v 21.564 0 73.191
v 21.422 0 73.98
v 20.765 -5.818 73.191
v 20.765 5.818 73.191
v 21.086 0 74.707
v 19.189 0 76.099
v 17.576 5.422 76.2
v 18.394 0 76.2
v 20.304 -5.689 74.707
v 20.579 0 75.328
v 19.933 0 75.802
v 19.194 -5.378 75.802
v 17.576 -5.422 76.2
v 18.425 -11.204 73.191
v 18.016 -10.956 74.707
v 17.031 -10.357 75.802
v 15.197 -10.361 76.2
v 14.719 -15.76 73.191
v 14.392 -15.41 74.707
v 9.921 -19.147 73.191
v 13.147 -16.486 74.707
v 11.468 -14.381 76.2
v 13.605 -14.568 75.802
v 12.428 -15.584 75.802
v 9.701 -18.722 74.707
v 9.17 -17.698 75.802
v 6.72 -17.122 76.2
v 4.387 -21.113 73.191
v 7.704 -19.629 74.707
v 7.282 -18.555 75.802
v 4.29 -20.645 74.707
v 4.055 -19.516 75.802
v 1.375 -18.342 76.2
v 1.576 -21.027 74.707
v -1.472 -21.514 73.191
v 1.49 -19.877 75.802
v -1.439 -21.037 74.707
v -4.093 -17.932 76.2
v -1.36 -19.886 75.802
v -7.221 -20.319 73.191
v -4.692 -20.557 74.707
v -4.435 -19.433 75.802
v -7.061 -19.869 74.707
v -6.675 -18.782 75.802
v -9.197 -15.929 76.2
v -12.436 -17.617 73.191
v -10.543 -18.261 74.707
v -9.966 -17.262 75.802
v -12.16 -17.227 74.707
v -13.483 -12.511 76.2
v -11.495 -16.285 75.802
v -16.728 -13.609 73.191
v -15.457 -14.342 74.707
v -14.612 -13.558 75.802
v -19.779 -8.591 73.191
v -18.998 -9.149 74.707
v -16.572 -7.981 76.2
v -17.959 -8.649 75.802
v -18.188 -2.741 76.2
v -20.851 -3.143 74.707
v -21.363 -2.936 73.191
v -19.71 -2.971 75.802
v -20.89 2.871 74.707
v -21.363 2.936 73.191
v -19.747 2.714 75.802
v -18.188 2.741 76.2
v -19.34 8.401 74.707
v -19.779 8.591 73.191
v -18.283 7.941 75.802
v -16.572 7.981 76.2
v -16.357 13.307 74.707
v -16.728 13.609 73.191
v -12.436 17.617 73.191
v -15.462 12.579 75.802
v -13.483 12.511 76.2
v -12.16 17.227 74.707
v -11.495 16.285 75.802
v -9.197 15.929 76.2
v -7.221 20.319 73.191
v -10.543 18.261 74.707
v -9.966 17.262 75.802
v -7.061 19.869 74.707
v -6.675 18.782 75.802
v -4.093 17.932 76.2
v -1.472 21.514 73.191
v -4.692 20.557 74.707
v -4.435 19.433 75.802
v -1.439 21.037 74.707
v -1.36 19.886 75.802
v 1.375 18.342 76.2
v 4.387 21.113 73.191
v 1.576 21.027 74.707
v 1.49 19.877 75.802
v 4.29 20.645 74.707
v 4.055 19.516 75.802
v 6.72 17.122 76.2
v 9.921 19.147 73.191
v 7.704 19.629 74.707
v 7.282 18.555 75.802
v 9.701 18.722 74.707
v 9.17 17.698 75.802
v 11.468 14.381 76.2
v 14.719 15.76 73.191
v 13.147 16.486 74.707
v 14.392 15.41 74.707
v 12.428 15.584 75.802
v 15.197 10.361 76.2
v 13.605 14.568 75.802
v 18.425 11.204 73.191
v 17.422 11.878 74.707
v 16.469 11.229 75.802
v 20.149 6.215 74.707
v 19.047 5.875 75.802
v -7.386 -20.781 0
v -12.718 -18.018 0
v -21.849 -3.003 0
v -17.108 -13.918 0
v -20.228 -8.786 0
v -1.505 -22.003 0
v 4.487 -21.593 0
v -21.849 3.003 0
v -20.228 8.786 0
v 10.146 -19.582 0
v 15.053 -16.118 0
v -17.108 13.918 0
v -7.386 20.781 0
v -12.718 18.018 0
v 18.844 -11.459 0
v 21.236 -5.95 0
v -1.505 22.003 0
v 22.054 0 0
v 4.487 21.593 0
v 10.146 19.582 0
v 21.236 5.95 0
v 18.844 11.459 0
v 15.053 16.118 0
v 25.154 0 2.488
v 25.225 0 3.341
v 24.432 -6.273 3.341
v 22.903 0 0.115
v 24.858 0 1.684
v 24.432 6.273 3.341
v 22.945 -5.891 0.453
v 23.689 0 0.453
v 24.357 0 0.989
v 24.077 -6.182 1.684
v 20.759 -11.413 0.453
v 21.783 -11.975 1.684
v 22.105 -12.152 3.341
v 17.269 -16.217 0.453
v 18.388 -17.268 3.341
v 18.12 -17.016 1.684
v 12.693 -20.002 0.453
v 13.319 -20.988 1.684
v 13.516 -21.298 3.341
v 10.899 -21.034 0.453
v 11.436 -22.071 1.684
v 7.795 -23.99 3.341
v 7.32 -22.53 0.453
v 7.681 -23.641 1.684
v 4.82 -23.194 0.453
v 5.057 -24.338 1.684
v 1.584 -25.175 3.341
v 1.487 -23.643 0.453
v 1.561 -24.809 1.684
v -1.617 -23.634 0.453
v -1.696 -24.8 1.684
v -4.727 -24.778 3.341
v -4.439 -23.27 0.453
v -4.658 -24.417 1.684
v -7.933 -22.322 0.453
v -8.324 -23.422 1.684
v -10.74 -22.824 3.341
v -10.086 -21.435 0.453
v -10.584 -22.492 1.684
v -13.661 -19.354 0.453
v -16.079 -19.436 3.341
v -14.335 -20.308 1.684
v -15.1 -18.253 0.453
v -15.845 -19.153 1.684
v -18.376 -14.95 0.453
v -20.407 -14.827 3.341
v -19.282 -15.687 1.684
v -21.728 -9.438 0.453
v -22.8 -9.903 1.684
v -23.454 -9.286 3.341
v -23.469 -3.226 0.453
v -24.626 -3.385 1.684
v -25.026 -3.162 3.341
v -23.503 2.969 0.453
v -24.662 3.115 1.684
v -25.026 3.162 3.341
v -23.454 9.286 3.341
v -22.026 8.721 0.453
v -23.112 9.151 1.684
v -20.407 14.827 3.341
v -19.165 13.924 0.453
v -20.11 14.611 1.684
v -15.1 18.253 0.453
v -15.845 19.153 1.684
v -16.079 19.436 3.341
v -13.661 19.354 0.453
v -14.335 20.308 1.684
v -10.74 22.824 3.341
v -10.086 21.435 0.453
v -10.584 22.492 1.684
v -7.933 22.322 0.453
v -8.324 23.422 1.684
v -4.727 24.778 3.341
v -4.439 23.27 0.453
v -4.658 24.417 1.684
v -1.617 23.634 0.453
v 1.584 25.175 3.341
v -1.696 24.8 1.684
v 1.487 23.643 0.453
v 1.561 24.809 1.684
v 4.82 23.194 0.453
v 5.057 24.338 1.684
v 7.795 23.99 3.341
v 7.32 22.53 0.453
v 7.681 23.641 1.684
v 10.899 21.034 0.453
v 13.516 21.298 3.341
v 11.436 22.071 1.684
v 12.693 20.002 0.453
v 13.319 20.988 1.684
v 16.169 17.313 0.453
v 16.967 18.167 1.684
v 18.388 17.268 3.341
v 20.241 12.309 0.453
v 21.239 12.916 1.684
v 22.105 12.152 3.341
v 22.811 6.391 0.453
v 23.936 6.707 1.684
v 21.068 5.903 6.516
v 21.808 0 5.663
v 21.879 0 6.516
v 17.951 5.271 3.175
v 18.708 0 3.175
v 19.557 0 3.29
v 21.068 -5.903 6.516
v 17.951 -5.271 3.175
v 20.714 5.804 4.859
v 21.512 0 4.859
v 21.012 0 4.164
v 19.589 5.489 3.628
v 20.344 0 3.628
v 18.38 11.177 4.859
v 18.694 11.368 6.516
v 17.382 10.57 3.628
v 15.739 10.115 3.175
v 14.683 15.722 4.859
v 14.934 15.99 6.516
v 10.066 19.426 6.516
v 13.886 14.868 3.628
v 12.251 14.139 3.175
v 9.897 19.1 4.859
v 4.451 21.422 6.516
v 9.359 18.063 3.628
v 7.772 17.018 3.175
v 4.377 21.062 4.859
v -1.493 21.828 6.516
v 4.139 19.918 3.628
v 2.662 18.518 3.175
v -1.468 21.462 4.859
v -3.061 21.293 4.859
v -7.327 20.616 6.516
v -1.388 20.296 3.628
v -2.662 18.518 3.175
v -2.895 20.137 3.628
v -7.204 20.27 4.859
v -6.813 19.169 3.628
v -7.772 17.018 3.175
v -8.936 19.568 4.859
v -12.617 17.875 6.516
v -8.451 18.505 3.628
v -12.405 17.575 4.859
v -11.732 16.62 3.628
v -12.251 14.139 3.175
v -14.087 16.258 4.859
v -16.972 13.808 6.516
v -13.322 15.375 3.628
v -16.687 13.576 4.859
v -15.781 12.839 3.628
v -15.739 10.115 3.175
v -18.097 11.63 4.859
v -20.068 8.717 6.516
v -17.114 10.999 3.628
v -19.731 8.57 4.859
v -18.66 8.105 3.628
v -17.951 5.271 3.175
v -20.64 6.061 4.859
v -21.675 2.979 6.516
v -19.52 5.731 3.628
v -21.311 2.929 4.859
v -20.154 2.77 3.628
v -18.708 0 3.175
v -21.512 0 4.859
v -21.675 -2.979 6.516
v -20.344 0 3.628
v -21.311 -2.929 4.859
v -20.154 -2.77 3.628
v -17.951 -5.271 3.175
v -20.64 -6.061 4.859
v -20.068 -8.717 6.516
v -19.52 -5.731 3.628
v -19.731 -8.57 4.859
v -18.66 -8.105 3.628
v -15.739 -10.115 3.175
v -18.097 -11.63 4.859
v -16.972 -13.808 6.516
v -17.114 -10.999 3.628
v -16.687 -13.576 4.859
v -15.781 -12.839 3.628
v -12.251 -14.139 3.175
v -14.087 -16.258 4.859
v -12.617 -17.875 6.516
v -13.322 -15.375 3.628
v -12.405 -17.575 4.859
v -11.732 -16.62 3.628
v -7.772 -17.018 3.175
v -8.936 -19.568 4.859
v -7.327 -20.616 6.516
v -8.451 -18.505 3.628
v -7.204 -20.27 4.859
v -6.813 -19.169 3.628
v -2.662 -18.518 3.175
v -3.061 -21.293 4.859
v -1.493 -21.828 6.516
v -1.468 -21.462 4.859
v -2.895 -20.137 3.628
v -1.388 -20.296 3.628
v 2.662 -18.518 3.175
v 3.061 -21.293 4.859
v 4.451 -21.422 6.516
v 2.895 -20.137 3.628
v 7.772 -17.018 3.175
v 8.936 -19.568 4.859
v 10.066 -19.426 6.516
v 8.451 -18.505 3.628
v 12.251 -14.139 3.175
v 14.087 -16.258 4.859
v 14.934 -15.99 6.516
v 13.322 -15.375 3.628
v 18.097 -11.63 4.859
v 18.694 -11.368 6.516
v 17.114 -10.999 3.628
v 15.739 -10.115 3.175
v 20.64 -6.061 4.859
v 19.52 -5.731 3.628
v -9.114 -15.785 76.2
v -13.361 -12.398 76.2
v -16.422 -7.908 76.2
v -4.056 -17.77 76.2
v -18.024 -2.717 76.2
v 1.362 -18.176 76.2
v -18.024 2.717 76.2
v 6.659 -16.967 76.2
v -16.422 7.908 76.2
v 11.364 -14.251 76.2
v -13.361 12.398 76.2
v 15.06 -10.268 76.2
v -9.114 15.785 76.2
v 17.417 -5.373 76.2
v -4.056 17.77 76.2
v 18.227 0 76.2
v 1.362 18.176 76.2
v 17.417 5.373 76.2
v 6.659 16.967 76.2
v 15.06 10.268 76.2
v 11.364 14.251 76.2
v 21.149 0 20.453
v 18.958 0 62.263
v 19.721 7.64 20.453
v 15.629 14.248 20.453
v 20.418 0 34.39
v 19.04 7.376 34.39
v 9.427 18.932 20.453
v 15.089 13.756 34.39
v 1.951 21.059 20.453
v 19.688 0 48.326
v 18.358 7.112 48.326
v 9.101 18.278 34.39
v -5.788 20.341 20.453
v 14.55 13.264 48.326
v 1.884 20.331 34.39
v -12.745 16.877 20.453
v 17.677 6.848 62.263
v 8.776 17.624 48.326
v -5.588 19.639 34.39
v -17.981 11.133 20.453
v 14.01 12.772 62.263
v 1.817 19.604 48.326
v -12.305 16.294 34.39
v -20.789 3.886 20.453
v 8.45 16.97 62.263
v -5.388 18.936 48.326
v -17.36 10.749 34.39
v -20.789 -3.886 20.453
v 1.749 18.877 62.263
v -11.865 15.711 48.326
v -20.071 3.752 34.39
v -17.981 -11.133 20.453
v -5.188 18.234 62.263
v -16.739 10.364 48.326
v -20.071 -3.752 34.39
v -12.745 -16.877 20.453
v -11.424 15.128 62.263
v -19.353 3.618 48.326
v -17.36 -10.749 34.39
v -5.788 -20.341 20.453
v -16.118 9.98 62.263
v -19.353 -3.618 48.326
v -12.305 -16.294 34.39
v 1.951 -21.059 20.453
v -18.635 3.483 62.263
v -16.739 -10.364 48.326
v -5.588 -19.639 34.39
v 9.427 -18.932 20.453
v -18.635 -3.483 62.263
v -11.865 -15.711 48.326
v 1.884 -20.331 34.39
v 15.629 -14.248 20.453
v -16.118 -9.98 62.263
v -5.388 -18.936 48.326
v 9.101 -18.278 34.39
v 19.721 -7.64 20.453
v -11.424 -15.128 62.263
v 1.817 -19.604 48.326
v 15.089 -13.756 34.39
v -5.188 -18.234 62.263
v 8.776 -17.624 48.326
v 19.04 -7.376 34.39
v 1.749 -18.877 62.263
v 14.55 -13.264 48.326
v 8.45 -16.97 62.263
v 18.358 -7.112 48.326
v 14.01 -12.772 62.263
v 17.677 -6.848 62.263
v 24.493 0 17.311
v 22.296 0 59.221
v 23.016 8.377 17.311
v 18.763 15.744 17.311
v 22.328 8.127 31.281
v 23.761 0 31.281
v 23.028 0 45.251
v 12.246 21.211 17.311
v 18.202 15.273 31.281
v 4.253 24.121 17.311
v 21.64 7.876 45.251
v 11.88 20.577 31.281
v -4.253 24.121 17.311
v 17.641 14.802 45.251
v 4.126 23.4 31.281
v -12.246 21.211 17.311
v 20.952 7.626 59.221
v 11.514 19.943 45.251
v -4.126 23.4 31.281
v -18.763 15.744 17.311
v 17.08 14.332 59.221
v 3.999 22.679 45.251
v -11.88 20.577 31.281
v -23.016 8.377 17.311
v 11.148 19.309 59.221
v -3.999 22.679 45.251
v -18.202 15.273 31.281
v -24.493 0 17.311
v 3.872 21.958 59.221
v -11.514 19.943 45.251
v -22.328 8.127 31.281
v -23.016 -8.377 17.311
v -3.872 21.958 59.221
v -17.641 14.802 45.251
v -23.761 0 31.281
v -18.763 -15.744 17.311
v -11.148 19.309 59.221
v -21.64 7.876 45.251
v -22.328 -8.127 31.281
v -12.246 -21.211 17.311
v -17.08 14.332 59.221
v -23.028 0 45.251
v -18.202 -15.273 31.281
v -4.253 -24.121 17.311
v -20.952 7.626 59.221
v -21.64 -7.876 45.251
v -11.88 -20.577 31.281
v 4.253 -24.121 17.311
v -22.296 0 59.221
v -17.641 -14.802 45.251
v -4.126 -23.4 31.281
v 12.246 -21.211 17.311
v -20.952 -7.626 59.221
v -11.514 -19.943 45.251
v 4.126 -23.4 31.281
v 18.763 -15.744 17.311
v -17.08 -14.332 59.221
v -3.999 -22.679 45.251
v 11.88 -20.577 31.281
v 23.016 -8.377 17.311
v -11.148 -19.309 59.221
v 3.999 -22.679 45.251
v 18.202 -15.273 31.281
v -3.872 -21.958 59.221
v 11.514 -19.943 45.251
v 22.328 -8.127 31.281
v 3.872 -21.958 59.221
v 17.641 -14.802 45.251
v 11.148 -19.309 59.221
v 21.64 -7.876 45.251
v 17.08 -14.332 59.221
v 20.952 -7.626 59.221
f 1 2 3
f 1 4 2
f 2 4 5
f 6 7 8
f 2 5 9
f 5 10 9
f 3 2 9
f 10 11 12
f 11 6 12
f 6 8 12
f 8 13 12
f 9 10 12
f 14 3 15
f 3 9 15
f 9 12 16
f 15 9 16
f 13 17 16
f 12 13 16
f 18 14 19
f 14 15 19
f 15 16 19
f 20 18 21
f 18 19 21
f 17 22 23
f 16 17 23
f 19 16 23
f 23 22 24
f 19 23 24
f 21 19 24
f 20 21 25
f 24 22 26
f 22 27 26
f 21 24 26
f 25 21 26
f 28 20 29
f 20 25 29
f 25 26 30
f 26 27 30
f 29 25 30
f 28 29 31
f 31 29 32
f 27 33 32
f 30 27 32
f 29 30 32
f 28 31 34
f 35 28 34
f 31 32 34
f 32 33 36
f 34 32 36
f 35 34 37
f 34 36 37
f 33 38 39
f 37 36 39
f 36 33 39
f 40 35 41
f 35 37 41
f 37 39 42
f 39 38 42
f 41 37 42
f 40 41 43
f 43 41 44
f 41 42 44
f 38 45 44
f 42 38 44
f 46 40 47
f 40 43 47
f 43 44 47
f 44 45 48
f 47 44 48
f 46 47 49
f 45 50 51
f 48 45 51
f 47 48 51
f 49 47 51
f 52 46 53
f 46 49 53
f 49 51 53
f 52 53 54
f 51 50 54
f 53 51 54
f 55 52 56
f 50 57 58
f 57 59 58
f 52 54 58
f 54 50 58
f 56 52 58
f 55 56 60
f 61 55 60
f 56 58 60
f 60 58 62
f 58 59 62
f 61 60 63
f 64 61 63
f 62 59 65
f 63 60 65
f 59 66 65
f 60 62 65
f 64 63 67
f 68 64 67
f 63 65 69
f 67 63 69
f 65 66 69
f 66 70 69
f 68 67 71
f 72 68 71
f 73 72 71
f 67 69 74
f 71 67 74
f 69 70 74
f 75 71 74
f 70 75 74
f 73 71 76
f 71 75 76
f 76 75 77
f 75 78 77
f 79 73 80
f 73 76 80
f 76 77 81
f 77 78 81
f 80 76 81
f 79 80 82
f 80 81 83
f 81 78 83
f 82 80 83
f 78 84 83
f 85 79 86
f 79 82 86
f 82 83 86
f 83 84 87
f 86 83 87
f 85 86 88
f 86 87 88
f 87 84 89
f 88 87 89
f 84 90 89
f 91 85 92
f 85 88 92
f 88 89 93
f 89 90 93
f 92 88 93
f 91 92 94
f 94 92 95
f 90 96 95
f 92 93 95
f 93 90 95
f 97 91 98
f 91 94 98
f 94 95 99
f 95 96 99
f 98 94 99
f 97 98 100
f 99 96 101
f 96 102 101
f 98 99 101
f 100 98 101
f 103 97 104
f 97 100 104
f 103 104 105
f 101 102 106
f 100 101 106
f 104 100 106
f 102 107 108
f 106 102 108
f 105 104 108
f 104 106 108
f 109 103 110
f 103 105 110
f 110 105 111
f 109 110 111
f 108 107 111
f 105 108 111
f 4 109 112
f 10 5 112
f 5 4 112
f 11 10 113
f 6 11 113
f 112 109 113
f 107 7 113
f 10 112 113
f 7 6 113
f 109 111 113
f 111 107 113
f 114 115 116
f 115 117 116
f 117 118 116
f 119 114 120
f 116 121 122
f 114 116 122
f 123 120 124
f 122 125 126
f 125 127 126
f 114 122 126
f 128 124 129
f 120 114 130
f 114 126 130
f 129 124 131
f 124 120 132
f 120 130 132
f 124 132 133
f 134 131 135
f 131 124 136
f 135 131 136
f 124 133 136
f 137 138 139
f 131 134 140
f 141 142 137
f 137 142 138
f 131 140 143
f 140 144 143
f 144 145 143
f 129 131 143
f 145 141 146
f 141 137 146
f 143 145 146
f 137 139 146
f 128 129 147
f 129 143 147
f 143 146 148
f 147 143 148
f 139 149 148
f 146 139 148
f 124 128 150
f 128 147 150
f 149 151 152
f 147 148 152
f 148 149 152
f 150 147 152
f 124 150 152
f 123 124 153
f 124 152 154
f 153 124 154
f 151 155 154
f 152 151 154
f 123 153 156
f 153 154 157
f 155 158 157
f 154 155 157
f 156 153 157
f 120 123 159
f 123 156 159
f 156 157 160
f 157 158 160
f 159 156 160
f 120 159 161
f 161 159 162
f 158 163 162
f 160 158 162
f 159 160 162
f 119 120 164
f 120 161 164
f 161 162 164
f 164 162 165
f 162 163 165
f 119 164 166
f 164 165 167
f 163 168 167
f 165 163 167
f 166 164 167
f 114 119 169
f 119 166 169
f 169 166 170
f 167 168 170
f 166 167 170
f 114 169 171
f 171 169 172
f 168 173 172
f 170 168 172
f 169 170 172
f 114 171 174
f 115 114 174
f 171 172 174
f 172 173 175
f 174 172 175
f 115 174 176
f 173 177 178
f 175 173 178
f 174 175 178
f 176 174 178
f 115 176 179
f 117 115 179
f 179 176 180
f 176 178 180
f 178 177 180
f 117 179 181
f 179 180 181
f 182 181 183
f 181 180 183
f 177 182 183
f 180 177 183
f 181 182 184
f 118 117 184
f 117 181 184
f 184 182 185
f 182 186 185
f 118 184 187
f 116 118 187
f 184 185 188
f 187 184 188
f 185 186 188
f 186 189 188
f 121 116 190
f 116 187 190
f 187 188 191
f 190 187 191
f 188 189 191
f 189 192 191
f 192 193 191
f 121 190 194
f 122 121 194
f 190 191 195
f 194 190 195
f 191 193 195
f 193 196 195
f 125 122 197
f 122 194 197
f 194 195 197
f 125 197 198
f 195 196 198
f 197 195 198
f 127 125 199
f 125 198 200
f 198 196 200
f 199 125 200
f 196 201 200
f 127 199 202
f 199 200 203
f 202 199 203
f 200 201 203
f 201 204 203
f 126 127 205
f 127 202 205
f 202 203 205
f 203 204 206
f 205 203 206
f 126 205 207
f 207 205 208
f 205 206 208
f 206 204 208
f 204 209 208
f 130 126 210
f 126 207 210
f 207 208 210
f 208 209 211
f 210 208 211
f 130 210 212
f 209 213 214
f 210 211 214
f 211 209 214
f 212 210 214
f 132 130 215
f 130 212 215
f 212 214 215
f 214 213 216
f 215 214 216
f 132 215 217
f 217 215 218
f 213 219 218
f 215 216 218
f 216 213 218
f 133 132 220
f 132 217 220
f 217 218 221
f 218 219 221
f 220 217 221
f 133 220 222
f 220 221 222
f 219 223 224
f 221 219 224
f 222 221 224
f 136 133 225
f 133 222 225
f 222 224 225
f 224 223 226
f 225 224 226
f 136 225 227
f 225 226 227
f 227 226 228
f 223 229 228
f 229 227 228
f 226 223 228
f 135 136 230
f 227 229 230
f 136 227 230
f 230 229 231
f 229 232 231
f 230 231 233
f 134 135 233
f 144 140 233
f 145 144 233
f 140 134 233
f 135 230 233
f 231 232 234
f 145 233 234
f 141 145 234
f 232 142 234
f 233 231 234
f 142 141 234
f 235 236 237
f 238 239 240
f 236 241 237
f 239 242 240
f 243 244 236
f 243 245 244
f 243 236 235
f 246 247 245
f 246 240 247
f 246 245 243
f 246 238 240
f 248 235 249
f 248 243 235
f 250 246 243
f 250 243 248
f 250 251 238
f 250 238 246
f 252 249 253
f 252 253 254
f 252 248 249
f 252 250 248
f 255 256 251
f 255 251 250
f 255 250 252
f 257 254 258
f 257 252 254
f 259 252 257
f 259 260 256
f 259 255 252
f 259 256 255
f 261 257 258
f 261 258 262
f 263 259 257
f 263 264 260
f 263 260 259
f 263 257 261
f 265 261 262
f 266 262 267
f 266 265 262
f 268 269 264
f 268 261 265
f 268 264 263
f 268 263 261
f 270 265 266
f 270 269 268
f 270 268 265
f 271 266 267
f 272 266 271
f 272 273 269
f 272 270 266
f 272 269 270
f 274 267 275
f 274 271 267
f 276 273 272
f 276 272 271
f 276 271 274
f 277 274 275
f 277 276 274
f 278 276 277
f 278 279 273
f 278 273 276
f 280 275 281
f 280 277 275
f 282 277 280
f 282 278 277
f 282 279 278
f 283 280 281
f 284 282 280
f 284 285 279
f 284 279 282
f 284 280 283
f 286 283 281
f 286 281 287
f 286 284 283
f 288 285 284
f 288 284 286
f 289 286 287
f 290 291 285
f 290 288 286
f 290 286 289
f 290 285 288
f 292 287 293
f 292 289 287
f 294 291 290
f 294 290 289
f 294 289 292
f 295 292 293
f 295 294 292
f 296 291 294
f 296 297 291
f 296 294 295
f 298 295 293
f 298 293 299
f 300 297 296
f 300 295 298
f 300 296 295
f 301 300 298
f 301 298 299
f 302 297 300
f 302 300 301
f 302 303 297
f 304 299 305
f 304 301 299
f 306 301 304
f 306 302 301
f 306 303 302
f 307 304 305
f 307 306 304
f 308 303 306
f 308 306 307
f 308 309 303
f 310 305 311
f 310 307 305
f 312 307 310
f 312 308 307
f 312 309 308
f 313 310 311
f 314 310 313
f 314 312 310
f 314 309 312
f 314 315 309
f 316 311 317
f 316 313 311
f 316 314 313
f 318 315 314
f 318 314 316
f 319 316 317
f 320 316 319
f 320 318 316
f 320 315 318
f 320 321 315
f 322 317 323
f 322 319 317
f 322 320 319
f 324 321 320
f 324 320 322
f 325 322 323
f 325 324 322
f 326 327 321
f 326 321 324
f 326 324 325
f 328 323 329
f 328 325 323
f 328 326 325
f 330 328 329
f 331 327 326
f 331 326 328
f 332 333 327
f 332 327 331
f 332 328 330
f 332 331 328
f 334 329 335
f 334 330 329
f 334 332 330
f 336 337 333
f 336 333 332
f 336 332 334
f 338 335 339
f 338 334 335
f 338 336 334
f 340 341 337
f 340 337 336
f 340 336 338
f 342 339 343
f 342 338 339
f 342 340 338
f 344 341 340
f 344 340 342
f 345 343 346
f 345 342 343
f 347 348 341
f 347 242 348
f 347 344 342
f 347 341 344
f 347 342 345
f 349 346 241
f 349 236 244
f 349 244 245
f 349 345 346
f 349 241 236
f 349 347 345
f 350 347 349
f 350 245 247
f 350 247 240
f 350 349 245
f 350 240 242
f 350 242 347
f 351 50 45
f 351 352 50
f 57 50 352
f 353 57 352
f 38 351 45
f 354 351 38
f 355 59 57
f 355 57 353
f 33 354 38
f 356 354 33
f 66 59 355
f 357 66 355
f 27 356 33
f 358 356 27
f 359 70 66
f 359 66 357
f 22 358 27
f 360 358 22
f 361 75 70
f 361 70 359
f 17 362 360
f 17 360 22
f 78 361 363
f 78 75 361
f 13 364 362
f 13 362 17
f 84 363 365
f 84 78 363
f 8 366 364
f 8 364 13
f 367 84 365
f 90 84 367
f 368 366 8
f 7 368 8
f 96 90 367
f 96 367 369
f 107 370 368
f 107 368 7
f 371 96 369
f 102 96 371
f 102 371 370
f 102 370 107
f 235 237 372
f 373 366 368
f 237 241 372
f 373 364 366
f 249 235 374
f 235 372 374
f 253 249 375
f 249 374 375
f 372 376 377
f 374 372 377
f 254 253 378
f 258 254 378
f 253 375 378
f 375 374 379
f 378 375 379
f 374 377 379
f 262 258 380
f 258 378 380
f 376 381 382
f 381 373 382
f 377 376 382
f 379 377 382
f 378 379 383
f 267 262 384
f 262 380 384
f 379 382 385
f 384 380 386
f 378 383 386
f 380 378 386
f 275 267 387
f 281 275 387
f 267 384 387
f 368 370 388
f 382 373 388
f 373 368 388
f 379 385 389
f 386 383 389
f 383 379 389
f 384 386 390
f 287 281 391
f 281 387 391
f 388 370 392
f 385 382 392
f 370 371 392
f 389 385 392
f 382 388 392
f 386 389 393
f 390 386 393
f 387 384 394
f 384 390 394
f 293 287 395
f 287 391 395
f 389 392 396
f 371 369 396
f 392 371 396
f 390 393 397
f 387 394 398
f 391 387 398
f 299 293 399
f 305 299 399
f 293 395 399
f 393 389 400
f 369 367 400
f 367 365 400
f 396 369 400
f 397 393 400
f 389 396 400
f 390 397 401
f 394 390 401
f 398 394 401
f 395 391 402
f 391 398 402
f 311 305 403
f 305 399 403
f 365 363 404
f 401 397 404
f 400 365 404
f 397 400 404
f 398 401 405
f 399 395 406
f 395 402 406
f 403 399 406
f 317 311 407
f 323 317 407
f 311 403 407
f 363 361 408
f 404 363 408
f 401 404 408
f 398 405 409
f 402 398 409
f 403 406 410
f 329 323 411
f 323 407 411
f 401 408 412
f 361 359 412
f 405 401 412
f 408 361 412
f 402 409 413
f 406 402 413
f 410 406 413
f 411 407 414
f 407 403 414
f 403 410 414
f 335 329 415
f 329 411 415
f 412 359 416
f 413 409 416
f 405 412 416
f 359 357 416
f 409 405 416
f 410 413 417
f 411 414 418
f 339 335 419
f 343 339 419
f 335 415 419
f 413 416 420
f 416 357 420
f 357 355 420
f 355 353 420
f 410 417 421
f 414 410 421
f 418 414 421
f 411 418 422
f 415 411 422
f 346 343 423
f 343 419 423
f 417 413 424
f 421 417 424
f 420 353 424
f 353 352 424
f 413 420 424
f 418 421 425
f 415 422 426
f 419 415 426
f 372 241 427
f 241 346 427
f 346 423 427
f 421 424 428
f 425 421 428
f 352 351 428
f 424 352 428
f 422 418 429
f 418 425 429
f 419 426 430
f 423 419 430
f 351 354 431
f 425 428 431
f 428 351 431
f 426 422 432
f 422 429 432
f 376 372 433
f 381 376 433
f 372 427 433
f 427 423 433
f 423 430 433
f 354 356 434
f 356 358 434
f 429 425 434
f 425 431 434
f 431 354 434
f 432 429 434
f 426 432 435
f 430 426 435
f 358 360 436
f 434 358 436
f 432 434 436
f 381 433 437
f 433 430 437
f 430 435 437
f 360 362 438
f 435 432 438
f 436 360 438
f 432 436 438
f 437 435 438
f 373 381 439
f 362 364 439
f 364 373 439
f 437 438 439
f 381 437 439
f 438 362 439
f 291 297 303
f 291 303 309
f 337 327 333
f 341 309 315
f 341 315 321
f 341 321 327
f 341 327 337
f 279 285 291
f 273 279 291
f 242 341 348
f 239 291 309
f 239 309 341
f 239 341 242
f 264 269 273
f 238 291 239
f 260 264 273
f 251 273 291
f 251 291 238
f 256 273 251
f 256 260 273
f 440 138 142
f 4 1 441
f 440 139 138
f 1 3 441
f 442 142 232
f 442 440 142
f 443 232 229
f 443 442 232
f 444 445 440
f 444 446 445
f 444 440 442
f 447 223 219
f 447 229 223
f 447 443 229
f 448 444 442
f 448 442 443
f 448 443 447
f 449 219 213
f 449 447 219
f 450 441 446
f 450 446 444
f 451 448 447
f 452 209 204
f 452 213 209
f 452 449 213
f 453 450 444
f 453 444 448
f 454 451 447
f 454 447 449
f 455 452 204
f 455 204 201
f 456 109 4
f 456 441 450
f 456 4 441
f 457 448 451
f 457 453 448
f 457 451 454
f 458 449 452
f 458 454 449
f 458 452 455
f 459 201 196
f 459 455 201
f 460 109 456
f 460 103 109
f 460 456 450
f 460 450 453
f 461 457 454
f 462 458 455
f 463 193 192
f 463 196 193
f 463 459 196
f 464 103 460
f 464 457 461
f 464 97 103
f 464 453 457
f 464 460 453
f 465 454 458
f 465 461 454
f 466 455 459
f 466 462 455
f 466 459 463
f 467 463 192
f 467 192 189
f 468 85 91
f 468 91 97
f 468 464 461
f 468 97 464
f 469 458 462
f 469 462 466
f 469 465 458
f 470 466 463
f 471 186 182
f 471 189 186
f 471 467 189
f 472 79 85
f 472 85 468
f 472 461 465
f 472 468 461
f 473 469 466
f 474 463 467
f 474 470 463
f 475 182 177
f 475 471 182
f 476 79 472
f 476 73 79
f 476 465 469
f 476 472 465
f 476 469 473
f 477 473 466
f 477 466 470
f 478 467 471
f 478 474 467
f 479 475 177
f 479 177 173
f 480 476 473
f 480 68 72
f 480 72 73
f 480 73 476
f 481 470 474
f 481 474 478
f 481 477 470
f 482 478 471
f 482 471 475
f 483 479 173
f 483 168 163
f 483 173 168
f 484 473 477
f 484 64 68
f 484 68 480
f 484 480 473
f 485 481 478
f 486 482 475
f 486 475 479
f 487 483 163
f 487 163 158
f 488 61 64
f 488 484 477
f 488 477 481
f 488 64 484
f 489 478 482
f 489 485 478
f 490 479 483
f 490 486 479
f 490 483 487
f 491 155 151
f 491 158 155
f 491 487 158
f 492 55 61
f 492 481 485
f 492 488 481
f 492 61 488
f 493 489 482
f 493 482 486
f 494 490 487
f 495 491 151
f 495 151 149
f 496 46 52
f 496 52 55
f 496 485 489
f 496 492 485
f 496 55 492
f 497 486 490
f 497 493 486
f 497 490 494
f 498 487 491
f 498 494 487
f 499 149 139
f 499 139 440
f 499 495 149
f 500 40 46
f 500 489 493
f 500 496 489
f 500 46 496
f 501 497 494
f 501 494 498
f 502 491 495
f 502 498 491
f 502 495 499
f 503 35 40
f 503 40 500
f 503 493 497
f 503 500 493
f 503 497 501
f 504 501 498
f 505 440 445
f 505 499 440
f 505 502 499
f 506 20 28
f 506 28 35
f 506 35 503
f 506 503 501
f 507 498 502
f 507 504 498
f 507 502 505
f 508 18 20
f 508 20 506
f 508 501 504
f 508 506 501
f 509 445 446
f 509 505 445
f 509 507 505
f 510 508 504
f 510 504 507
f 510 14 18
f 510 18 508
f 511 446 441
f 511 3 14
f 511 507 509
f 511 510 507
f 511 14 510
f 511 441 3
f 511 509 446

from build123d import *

# Parameters (mm, degrees)
F0_R     = 25.4
F1_DEPTH = 76.2
F1_TAPER = 3
F2_T     = -3.175
F3_R     = 3.175


with BuildPart() as f1:
    # F0 (on Top) → F1 (new body)
    with BuildSketch(Plane.XY):
        Circle(F0_R)
    extrude(amount=F1_DEPTH, taper=F1_TAPER)

    # F2
    f2_openings = [f1.faces().sort_by_distance(p)[0] for p in [
        (0, 0, 76.2),
    ]]
    offset(amount=F2_T, openings=f2_openings)

    # F3
    f3_edges = [f1.edges().sort_by_distance(p)[0] for p in [
        (-22.054248, 0, 3.175),
        (-21.406527, 0, 76.2),
        (-25.4, 0, 0),
    ]]
    fillet(f3_edges, radius=F3_R)


solid = f1.part
